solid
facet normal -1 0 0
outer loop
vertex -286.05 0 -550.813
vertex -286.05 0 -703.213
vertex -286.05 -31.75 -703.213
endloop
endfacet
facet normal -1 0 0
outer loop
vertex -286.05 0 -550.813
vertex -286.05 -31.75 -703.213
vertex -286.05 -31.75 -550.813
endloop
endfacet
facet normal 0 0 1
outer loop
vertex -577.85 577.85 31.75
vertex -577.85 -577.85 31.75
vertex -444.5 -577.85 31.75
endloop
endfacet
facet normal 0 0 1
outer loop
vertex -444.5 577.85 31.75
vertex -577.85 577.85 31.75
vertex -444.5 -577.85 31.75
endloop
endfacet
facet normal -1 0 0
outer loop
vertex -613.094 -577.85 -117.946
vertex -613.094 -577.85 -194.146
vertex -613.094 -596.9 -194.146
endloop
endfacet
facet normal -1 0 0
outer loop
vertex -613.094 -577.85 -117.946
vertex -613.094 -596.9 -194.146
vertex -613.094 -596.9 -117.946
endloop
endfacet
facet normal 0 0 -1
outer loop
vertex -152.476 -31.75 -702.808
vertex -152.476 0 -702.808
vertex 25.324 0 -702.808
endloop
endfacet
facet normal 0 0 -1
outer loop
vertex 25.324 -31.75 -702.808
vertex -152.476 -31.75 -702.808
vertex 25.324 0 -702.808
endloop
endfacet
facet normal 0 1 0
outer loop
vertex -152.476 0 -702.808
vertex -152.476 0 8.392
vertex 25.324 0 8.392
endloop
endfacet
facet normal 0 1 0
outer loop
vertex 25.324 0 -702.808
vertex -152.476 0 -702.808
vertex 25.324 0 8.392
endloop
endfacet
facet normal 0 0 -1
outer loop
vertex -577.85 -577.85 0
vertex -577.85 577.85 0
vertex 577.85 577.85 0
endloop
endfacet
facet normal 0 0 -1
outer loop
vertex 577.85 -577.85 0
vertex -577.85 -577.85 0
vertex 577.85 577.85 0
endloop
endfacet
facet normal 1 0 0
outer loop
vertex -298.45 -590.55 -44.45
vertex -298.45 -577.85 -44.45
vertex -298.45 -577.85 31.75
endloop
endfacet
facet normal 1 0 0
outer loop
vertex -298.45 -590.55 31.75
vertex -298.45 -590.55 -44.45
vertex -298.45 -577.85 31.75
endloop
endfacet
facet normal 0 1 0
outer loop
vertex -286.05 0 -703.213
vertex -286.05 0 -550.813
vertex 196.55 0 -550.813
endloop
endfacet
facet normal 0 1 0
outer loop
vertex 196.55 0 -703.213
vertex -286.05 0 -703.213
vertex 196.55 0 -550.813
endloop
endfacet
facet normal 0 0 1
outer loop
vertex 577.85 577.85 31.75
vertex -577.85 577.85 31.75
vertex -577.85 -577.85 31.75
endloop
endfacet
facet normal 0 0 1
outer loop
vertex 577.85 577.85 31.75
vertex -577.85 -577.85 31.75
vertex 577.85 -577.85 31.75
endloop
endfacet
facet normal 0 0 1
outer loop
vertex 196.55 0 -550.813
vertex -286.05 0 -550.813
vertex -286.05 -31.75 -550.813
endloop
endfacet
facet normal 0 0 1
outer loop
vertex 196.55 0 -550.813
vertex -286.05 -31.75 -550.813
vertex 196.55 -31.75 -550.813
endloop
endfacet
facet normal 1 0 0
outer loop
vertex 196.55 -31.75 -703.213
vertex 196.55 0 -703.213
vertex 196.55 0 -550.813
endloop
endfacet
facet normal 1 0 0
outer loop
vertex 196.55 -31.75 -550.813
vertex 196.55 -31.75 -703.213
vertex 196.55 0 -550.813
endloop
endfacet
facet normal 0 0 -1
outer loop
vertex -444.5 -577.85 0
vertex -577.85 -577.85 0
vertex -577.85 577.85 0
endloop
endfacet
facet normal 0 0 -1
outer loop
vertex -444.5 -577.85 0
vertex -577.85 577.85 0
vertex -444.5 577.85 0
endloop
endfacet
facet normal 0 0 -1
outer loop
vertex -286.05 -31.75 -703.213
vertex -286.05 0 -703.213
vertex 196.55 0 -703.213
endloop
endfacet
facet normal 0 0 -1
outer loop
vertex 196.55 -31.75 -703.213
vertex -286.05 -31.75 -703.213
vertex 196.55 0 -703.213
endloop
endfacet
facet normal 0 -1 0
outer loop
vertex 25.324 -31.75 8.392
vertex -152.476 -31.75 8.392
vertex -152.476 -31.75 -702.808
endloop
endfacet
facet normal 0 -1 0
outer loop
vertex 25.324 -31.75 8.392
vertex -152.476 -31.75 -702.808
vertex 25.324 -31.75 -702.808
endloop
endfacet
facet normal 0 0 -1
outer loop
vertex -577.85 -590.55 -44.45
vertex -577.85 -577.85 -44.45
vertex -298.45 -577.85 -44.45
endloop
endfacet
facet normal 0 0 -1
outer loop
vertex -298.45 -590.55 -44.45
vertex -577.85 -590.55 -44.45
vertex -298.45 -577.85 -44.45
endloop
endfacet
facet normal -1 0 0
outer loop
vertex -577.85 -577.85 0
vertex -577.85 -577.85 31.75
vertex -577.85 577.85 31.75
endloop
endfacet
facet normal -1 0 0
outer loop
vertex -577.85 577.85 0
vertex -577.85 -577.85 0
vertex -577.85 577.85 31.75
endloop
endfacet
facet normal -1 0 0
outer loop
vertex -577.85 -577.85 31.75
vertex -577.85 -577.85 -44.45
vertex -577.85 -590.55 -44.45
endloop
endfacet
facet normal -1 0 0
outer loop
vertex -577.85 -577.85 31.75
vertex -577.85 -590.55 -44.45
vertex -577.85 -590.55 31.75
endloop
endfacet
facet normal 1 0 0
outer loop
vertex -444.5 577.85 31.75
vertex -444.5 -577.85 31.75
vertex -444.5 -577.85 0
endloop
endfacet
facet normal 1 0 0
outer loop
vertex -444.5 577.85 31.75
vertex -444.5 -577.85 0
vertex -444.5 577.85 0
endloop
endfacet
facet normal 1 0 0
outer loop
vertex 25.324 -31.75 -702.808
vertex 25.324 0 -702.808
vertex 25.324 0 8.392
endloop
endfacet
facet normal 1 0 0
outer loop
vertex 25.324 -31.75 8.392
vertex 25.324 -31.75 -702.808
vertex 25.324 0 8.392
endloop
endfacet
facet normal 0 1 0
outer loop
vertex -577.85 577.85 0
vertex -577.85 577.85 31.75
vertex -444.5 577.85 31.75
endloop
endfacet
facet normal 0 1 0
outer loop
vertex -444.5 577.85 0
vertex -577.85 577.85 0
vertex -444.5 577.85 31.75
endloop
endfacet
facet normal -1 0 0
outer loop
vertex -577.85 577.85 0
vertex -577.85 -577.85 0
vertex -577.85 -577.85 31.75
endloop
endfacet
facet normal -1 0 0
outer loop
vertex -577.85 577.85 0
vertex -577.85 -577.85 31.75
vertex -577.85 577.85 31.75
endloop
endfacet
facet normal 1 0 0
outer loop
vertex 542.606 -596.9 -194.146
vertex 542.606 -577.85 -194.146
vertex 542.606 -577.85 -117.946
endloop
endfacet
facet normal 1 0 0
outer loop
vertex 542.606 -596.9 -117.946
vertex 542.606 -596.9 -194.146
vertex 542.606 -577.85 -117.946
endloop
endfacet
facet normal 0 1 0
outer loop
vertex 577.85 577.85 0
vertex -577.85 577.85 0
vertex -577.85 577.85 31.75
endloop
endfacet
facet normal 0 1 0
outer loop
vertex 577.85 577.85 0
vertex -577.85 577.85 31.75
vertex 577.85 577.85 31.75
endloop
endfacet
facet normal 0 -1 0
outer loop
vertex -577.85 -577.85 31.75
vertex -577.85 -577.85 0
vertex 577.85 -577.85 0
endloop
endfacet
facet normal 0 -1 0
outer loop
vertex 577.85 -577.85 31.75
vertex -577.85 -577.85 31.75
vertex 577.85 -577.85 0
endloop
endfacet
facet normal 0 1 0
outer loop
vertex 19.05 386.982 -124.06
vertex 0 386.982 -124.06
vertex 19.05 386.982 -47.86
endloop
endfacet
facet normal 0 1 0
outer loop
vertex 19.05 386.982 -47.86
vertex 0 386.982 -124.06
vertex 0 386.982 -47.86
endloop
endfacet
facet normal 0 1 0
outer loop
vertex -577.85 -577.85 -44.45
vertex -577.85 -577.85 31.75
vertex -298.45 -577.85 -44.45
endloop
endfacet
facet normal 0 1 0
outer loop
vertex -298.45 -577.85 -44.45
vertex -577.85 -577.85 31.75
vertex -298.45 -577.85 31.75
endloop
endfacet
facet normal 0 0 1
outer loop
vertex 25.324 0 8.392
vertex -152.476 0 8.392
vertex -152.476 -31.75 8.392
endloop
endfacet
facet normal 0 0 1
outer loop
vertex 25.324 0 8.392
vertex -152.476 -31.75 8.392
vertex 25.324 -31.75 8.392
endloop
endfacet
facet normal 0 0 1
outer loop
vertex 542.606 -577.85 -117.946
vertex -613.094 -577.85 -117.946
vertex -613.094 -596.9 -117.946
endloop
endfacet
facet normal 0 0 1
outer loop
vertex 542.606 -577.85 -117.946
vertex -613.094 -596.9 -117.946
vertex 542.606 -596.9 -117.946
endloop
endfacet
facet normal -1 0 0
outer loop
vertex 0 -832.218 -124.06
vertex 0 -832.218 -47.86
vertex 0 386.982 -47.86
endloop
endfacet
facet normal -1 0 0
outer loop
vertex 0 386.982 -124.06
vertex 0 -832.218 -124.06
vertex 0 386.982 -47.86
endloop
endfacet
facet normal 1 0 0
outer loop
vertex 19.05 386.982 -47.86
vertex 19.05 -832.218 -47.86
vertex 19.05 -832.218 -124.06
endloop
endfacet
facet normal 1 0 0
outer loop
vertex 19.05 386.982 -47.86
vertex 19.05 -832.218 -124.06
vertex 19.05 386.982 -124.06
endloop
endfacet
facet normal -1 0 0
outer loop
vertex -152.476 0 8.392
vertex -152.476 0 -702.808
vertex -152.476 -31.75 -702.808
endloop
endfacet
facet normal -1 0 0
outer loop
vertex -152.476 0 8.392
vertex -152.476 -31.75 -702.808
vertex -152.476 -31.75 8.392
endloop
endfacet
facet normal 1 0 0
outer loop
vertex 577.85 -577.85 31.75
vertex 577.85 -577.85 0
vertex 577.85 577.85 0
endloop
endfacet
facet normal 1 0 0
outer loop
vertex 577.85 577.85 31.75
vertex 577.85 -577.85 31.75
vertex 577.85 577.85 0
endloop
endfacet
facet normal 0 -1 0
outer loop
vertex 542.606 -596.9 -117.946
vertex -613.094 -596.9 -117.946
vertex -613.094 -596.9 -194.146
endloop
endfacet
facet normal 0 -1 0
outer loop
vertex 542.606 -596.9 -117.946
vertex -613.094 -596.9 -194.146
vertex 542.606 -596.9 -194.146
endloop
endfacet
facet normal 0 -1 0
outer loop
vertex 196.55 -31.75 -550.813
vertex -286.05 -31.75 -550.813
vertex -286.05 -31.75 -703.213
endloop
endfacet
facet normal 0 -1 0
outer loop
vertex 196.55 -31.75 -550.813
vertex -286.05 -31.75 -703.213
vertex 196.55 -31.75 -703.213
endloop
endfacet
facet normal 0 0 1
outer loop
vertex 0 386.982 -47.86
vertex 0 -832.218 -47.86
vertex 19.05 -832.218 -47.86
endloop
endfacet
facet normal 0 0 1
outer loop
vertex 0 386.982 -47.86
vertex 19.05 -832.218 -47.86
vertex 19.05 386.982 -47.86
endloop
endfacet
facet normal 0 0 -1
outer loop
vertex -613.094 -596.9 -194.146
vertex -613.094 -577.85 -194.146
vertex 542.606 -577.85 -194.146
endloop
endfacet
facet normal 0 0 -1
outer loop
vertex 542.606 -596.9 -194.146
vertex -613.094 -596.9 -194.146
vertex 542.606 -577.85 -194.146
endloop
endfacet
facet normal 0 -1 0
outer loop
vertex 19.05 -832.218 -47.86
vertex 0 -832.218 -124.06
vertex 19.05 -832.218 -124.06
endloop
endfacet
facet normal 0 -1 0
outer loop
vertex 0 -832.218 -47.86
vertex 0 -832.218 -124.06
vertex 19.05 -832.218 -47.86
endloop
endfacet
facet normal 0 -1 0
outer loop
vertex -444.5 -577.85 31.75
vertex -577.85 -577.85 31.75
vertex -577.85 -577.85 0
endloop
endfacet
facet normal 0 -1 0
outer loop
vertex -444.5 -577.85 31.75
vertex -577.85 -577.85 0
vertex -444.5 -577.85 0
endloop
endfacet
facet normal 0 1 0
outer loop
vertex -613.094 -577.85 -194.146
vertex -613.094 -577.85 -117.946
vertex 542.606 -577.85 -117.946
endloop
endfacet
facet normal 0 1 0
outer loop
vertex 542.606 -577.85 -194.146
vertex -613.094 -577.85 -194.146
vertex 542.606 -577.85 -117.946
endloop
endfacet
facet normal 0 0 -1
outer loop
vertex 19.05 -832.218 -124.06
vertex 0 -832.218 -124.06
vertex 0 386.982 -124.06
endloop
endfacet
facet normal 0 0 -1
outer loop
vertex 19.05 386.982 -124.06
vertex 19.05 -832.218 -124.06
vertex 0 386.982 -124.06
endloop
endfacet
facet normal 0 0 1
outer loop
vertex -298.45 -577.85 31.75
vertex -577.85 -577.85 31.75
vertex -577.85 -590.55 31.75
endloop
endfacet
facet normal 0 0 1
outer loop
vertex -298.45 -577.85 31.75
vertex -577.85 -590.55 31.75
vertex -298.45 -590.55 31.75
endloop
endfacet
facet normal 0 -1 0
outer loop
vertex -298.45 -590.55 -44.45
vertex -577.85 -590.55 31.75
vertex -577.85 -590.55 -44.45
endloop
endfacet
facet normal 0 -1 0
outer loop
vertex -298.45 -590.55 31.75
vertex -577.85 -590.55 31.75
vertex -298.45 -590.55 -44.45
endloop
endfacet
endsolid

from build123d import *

# Parameters (mm, degrees)
F0_W      = 1155.7
F0_H      = 1155.7
F1_DEPTH  = 31.75
F4_W      = 177.8
F4_H      = 711.2
F5_DEPTH  = 31.75
F6_W      = 133.35
F6_H      = 1155.7
F7_DEPTH  = 31.75
F3_W      = 279.4
F3_H      = 76.2
F8_DEPTH  = 12.7
F2_W      = 208.7145904064
F2_H      = 31.75
F9_DEPTH  = 19.05
F2_W_2    = 1155.7
F2_H_2    = 76.2
F11_W     = 1219.2
F11_H     = 76.2
F12_DEPTH = 19.05
F13_W     = 482.6
F13_H     = 152.4
F14_DEPTH = 31.75


with BuildPart() as f1:
    # F0 (on Top) → F1 (new body)
    with BuildSketch(Plane.XY):
        Rectangle(F0_W, F0_H)
    extrude(amount=F1_DEPTH)


with BuildPart() as f5:
    # F4 (on Front) → F5 (new body)
    with BuildSketch(Plane.XZ):
        with Locations((-63.575723362, -347.2077669195)):
            Rectangle(F4_W, F4_H)
    extrude(amount=F5_DEPTH)


with BuildPart() as f7:
    # F6 (on face) → F7 (new body)
    with BuildSketch(Plane.XY.offset(31.75)):
        with Locations((-511.175, 0)):
            Rectangle(F6_W, F6_H)
    extrude(amount=-F7_DEPTH)


with BuildPart() as f8:
    # F3 (on face) → F8 (new body)
    with BuildSketch(Plane.XZ.offset(577.85)):
        with Locations((-438.15, -6.35)):
            Rectangle(F3_W, F3_H)
    extrude(amount=F8_DEPTH)


with BuildPart() as f9:
    # F2 (on face) → F9 (new body)
    with BuildSketch(Plane.XZ.offset(577.85)):
        with Locations((473.4927047968, 15.875)):
            Rectangle(F2_W, F2_H)
    extrude(amount=F9_DEPTH)


with BuildPart() as f9b:
    # F2 (on face) → F9, piece 2 (new body)
    with BuildSketch(Plane.XZ.offset(577.85)):
        with Locations((-35.2438529968, -156.0455602646)):
            Rectangle(F2_W_2, F2_H_2)
    extrude(amount=F9_DEPTH)


with BuildPart() as f12:
    # F11 (on Right) → F12 (new body)
    with BuildSketch(Plane.YZ):
        with Locations((-222.6182788968, -85.9602801323)):
            Rectangle(F11_W, F11_H)
    extrude(amount=F12_DEPTH)


with BuildPart() as f14:
    # F13 (on Front) → F14 (new body)
    with BuildSketch(Plane.XZ):
        with Locations((-44.7499839599, -627.0127509117)):
            Rectangle(F13_W, F13_H)
    extrude(amount=F14_DEPTH)


solid = Compound([f1.part, f5.part, f7.part, f8.part, f9b.part, f12.part, f14.part])
